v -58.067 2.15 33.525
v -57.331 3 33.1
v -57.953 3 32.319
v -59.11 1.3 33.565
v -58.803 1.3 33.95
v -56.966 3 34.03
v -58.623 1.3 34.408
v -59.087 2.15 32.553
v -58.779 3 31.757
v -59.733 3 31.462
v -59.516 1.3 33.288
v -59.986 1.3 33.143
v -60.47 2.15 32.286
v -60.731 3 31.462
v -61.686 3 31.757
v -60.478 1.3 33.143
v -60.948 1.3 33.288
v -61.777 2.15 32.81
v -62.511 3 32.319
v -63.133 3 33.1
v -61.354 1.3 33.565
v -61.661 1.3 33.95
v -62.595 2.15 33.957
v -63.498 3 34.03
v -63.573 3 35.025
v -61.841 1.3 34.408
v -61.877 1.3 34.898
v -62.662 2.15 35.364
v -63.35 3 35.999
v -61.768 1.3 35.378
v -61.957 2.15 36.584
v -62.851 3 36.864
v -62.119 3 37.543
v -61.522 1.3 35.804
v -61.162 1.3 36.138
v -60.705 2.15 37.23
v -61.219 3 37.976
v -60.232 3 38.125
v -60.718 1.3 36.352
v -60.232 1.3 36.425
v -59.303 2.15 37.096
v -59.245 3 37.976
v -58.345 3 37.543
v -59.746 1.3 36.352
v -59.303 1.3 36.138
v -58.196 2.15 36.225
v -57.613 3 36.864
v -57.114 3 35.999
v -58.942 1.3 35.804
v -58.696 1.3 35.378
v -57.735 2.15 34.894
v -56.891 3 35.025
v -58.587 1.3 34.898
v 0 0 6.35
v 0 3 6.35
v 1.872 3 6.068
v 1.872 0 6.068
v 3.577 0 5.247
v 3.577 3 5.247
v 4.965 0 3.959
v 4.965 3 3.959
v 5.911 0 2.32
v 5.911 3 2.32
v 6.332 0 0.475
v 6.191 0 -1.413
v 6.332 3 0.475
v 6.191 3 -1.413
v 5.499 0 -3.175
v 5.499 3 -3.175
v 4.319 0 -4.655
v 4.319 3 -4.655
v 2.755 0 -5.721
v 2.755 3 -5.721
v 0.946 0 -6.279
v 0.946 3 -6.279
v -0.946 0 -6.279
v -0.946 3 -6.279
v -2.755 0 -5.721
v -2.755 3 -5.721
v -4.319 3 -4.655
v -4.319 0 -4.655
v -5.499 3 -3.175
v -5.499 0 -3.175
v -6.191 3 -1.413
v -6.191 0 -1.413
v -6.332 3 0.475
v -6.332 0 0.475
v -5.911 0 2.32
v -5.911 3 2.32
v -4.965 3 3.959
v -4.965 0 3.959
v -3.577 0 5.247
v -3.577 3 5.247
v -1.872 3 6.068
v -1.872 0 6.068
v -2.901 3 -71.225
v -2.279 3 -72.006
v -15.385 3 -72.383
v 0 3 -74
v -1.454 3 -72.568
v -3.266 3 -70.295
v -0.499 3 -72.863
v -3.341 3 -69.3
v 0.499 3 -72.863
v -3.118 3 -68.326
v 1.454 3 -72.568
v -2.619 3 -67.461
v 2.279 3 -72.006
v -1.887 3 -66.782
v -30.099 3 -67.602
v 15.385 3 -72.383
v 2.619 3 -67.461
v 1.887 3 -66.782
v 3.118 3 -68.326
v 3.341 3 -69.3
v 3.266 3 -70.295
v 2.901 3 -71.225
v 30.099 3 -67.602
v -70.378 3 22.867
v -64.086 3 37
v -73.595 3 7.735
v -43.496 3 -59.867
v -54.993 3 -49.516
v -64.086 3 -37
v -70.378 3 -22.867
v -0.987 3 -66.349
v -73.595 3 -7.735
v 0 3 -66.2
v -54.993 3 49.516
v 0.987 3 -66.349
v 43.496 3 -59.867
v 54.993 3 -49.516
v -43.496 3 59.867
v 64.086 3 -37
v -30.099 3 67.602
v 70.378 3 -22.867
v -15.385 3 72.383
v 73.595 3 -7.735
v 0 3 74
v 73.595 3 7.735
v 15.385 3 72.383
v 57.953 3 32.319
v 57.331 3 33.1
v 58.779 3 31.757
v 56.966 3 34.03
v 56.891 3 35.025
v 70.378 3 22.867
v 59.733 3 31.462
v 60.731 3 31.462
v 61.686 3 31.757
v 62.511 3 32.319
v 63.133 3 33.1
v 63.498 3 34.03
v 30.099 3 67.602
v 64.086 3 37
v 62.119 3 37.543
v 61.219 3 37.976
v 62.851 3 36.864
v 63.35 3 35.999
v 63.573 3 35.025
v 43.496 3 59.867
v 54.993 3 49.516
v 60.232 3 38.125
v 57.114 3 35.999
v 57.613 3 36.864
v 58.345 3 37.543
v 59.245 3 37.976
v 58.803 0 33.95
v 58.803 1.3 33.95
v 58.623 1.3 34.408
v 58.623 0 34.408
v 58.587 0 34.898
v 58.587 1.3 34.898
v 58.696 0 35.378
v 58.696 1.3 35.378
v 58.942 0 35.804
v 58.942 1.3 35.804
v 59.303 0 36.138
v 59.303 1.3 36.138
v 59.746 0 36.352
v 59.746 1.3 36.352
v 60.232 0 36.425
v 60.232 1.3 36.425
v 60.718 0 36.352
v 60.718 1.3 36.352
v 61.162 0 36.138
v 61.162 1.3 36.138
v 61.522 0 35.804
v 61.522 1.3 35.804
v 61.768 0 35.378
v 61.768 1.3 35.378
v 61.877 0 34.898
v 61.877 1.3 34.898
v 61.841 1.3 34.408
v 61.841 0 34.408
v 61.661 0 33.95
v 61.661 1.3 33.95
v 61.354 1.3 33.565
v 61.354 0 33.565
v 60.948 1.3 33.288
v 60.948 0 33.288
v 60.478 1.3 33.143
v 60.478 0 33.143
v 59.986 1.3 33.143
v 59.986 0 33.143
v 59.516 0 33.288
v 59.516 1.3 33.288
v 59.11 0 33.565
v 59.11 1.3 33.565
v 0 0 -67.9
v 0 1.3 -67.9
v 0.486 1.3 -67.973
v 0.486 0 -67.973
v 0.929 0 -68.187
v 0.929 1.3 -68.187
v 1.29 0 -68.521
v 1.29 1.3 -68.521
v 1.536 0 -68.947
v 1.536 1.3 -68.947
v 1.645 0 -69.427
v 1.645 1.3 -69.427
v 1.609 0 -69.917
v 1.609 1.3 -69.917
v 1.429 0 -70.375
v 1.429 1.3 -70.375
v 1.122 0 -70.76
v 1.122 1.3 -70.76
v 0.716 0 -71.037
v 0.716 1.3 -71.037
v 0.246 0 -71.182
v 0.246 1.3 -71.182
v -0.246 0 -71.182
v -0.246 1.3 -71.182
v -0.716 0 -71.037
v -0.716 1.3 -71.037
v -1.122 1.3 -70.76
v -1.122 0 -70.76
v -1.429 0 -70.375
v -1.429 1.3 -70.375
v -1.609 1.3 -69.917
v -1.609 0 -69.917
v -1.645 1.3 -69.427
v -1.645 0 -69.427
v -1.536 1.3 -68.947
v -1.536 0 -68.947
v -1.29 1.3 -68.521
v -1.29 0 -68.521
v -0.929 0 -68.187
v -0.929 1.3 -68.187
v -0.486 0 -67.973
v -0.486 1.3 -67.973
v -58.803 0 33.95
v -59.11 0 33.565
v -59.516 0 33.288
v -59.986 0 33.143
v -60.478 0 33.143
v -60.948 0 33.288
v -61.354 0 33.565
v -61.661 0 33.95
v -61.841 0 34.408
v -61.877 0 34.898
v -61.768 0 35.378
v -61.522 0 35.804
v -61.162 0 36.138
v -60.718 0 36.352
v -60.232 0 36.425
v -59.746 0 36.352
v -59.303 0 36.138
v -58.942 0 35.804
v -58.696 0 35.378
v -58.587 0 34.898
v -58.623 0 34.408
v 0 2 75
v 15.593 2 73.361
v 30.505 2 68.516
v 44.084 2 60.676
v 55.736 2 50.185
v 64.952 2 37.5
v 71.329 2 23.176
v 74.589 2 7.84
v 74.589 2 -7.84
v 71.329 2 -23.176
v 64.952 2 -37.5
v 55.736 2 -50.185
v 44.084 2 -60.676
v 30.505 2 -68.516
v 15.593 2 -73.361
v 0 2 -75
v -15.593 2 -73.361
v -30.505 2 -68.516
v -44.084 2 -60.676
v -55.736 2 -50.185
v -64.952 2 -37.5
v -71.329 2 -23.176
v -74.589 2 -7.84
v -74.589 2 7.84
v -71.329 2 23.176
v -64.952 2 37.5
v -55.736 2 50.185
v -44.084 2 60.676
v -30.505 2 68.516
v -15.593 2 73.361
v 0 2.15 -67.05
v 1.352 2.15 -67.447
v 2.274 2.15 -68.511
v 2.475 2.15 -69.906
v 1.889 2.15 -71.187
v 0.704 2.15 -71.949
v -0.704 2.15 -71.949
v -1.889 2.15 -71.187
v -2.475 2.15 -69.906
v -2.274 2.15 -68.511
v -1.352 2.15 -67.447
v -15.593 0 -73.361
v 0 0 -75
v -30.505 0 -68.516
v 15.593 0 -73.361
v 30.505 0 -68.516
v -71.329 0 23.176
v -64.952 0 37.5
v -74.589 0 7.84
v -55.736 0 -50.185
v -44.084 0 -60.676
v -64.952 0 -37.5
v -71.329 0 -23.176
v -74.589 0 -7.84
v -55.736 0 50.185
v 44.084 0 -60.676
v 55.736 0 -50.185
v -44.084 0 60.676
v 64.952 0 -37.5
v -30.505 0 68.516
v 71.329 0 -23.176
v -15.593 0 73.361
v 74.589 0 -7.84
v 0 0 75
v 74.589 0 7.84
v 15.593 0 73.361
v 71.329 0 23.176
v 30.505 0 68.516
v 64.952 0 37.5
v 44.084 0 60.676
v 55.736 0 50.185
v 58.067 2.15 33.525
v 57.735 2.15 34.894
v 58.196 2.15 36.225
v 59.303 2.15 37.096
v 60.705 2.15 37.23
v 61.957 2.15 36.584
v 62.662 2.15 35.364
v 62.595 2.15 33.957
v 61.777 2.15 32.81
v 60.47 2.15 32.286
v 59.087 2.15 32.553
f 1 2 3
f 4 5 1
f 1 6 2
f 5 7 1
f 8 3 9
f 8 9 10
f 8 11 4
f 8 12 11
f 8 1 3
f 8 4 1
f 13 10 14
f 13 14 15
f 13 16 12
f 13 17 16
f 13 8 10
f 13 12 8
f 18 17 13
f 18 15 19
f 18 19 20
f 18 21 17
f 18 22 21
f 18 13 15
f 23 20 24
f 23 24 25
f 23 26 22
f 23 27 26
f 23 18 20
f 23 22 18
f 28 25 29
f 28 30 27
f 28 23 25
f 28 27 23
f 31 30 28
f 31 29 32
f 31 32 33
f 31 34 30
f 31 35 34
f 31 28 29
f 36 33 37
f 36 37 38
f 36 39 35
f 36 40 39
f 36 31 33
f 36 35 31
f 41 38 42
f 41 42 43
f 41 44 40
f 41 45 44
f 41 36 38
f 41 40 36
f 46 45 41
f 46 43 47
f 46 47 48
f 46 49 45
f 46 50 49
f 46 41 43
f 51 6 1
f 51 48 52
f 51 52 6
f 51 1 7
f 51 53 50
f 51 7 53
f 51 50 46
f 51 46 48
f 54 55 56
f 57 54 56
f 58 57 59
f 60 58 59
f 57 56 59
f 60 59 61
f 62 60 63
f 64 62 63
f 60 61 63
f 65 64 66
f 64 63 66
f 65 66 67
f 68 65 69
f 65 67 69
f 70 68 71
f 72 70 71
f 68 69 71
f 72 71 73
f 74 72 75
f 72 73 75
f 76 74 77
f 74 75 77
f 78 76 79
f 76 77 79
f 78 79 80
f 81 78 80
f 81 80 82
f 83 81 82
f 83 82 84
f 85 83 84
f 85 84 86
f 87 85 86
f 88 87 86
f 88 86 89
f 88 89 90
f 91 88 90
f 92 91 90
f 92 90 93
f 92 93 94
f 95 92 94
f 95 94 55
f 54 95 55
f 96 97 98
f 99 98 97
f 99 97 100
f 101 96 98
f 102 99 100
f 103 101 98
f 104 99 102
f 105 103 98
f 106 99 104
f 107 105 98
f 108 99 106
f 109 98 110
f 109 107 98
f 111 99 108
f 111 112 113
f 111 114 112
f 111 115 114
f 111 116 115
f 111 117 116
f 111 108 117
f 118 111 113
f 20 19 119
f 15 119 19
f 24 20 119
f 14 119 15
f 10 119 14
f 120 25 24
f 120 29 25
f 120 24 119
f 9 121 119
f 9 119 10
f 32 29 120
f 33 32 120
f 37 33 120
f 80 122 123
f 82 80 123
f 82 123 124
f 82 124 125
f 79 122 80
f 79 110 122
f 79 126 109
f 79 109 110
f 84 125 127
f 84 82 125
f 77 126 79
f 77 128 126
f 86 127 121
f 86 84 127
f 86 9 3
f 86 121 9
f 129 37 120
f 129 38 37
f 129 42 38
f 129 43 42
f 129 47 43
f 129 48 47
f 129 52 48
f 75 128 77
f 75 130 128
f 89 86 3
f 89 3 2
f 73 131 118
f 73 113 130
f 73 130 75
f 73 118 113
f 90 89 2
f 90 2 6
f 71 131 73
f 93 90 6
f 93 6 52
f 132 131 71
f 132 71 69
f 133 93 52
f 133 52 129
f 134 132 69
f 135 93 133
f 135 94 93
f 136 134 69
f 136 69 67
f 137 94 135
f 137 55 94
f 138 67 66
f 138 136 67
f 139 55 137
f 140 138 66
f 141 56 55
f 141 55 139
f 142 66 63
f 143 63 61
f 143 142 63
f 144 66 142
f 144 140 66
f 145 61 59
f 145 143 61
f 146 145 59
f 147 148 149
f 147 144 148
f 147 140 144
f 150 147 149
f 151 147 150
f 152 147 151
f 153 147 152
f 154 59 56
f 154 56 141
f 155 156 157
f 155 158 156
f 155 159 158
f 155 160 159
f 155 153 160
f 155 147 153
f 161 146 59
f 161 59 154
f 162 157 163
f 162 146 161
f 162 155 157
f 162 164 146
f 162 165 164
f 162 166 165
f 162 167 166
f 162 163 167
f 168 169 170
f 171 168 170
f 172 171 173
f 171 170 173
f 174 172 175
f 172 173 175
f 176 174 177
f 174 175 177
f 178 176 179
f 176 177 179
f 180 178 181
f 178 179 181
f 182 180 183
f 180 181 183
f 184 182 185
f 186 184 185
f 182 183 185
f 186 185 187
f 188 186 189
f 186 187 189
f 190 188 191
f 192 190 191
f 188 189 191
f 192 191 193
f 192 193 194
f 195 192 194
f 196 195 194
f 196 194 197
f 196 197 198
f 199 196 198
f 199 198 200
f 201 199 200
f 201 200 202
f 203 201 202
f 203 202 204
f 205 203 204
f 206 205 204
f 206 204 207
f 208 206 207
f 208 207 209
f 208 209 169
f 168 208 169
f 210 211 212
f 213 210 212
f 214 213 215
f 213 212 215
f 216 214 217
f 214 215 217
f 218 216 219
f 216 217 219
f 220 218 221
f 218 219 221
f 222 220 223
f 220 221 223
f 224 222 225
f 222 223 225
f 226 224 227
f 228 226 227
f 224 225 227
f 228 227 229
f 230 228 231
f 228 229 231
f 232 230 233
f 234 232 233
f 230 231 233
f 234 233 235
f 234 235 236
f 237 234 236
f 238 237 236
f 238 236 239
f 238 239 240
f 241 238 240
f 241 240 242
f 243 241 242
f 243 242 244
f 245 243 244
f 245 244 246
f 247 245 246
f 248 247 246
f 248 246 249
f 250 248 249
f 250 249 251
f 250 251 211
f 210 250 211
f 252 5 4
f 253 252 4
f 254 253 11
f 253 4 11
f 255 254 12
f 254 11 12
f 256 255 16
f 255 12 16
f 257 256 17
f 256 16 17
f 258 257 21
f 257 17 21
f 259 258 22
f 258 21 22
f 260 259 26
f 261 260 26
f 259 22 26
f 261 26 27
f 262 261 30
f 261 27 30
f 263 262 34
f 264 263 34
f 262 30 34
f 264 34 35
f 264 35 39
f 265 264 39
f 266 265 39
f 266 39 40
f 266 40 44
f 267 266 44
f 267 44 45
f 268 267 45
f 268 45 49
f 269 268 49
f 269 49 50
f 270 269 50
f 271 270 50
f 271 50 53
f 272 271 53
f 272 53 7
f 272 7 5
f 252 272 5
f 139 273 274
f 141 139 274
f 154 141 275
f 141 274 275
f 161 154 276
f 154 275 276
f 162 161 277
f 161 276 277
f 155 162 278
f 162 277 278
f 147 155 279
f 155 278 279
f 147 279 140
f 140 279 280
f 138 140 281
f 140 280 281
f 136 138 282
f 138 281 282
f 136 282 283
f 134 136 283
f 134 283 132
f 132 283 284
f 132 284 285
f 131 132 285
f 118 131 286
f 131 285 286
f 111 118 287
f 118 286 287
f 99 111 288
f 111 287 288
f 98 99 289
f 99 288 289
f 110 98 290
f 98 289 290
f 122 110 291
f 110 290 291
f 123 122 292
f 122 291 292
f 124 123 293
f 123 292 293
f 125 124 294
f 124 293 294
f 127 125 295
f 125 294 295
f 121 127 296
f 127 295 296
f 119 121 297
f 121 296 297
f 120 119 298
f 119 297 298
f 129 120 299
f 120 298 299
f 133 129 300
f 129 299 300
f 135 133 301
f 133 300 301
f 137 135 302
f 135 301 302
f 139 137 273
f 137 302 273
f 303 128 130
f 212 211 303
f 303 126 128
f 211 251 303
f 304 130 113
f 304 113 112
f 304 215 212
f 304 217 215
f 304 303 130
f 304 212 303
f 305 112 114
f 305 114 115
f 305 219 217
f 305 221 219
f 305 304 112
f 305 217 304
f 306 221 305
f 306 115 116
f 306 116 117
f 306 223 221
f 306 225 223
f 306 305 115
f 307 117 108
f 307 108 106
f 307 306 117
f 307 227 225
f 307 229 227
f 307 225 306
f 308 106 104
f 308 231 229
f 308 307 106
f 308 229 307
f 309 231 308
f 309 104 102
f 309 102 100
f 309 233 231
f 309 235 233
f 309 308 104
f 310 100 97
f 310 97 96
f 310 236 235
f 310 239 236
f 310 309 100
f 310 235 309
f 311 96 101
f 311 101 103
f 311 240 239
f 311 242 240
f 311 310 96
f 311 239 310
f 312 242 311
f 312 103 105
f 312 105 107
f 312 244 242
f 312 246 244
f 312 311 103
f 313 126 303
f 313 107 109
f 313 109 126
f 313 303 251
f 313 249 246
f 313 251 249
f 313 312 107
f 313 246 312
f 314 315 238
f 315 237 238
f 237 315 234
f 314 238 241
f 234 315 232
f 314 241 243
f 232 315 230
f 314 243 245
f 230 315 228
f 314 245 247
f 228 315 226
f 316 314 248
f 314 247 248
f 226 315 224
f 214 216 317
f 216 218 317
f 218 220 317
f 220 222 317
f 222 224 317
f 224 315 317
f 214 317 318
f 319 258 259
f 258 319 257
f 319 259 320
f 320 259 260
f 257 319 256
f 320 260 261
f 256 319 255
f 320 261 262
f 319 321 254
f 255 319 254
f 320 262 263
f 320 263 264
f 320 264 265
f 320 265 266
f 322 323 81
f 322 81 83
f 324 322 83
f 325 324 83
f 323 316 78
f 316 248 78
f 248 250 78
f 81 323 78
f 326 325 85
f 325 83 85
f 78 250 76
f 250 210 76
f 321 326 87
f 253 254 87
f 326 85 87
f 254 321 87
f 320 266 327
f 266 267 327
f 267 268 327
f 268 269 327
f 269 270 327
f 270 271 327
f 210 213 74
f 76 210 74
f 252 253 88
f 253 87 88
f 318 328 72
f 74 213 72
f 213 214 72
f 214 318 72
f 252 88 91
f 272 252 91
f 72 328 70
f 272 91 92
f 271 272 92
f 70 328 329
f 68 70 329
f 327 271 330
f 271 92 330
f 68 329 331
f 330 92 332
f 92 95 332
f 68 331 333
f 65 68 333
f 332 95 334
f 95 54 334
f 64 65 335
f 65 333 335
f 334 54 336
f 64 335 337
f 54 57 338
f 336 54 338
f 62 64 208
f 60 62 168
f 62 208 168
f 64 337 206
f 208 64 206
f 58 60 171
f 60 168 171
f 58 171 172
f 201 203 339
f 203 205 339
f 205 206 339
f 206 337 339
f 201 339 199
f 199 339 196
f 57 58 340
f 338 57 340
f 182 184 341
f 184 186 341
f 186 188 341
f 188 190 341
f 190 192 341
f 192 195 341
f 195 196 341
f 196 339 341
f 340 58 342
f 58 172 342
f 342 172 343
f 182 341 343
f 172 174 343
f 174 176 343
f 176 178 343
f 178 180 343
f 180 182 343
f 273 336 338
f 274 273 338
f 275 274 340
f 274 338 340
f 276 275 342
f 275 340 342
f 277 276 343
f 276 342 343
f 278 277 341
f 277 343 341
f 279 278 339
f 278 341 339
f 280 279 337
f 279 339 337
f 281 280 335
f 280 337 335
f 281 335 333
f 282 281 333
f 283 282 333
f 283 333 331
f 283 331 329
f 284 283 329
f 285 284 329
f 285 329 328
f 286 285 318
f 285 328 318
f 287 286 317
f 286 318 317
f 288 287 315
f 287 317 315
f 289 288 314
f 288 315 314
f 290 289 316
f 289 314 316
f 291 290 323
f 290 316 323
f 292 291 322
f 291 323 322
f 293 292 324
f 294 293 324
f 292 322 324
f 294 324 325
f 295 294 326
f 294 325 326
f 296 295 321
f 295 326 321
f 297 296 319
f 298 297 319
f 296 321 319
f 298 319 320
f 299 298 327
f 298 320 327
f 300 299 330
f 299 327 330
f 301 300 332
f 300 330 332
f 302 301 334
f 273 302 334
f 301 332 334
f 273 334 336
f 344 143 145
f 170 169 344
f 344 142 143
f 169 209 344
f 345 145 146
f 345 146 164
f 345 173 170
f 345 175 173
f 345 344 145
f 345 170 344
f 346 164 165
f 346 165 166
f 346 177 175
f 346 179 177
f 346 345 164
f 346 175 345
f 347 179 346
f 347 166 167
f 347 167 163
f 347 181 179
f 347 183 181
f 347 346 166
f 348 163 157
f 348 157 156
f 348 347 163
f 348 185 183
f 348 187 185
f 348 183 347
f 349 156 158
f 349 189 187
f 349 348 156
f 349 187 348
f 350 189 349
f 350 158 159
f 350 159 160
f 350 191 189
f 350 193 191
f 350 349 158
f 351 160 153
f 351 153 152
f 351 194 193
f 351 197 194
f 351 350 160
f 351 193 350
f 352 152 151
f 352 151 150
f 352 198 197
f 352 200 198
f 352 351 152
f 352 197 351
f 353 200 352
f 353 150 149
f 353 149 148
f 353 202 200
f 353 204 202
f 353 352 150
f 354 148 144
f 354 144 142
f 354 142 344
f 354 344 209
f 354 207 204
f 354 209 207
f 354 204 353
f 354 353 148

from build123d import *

# Parameters (mm, degrees)
SKETCH_1_R                           = 75
EXTRUDE_1_DEPTH                      = 3
SKETCH_2_R                           = 1.65
CUT_EXTRUDE_1_DEPTH                  = 107.108435103
CHAMFER_1_SIZE                       = 1.7
PATTERN_CIRCULAR_1_COUNT             = 3
CHAMFER_1_OF_PATTERN_CIRCULAR_1_SIZE = 1.7
SKETCH_3_R                           = 6.35
CUT_EXTRUDE_2_DEPTH                  = 107.108435103
CHAMFER_2_SIZE                       = 1


with BuildPart() as part:
    # Эскиз1 → Бобышка-Вытянуть1 (new body)
    with BuildSketch(Plane(origin=(0, 0, 0), x_dir=(1, 0, 0), z_dir=(0, 1, 0))):
        with Locations(Location((0, 0, 0), (0, 0, 270))):
            Circle(SKETCH_1_R)
    extrude(amount=EXTRUDE_1_DEPTH)

    # Эскиз2 → Вырез-Вытянуть1 (cut, through all)
    with BuildSketch(Plane(origin=(0, 3, 0), x_dir=(1, 0, 0), z_dir=(0, 1, 0))):
        with Locations(Location((0, 69.55, 0), (0, 0, 270))):
            Circle(SKETCH_2_R)
    cut_extrude_1 = extrude(amount=-CUT_EXTRUDE_1_DEPTH, mode=Mode.SUBTRACT)

    # Фаска1
    chamfer_1_edges = [part.edges().sort_by_distance(p)[0] for p in [
        (0, 3, -71.2),
    ]]
    chamfer(chamfer_1_edges, length=CHAMFER_1_SIZE)

    # Круговой массив1: Вырез-Вытянуть1 ×3 about axis
    pattern_circular_1_axis = Axis((0, 0, 0), (0, 1, 0))
    for i in range(1, PATTERN_CIRCULAR_1_COUNT):
        add(cut_extrude_1.rotate(pattern_circular_1_axis, i * 360 / PATTERN_CIRCULAR_1_COUNT), mode=Mode.SUBTRACT)

    # Фаска1 of Круговой массив1
    chamfer_1_of_pattern_circular_1_edges = [part.edges().sort_by_distance(p)[0] for p in [
        (-61.661008749, 3, 35.6),
        (61.661008749, 3, 35.6),
    ]]
    chamfer(chamfer_1_of_pattern_circular_1_edges, length=CHAMFER_1_OF_PATTERN_CIRCULAR_1_SIZE)

    # Эскиз3 → Вырез-Вытянуть2 (cut, through all)
    with BuildSketch(Plane(origin=(0, 3, 0), x_dir=(1, 0, 0), z_dir=(0, 1, 0))):
        with Locations(Location((0, 0, 0), (0, 0, 270))):
            Circle(SKETCH_3_R)
    extrude(amount=-CUT_EXTRUDE_2_DEPTH, mode=Mode.SUBTRACT)

    # Фаска2
    chamfer_2_edges = [part.edges().sort_by_distance(p)[0] for p in [
        (0, 3, -75),
    ]]
    chamfer(chamfer_2_edges, length=CHAMFER_2_SIZE)


solid = part.part
